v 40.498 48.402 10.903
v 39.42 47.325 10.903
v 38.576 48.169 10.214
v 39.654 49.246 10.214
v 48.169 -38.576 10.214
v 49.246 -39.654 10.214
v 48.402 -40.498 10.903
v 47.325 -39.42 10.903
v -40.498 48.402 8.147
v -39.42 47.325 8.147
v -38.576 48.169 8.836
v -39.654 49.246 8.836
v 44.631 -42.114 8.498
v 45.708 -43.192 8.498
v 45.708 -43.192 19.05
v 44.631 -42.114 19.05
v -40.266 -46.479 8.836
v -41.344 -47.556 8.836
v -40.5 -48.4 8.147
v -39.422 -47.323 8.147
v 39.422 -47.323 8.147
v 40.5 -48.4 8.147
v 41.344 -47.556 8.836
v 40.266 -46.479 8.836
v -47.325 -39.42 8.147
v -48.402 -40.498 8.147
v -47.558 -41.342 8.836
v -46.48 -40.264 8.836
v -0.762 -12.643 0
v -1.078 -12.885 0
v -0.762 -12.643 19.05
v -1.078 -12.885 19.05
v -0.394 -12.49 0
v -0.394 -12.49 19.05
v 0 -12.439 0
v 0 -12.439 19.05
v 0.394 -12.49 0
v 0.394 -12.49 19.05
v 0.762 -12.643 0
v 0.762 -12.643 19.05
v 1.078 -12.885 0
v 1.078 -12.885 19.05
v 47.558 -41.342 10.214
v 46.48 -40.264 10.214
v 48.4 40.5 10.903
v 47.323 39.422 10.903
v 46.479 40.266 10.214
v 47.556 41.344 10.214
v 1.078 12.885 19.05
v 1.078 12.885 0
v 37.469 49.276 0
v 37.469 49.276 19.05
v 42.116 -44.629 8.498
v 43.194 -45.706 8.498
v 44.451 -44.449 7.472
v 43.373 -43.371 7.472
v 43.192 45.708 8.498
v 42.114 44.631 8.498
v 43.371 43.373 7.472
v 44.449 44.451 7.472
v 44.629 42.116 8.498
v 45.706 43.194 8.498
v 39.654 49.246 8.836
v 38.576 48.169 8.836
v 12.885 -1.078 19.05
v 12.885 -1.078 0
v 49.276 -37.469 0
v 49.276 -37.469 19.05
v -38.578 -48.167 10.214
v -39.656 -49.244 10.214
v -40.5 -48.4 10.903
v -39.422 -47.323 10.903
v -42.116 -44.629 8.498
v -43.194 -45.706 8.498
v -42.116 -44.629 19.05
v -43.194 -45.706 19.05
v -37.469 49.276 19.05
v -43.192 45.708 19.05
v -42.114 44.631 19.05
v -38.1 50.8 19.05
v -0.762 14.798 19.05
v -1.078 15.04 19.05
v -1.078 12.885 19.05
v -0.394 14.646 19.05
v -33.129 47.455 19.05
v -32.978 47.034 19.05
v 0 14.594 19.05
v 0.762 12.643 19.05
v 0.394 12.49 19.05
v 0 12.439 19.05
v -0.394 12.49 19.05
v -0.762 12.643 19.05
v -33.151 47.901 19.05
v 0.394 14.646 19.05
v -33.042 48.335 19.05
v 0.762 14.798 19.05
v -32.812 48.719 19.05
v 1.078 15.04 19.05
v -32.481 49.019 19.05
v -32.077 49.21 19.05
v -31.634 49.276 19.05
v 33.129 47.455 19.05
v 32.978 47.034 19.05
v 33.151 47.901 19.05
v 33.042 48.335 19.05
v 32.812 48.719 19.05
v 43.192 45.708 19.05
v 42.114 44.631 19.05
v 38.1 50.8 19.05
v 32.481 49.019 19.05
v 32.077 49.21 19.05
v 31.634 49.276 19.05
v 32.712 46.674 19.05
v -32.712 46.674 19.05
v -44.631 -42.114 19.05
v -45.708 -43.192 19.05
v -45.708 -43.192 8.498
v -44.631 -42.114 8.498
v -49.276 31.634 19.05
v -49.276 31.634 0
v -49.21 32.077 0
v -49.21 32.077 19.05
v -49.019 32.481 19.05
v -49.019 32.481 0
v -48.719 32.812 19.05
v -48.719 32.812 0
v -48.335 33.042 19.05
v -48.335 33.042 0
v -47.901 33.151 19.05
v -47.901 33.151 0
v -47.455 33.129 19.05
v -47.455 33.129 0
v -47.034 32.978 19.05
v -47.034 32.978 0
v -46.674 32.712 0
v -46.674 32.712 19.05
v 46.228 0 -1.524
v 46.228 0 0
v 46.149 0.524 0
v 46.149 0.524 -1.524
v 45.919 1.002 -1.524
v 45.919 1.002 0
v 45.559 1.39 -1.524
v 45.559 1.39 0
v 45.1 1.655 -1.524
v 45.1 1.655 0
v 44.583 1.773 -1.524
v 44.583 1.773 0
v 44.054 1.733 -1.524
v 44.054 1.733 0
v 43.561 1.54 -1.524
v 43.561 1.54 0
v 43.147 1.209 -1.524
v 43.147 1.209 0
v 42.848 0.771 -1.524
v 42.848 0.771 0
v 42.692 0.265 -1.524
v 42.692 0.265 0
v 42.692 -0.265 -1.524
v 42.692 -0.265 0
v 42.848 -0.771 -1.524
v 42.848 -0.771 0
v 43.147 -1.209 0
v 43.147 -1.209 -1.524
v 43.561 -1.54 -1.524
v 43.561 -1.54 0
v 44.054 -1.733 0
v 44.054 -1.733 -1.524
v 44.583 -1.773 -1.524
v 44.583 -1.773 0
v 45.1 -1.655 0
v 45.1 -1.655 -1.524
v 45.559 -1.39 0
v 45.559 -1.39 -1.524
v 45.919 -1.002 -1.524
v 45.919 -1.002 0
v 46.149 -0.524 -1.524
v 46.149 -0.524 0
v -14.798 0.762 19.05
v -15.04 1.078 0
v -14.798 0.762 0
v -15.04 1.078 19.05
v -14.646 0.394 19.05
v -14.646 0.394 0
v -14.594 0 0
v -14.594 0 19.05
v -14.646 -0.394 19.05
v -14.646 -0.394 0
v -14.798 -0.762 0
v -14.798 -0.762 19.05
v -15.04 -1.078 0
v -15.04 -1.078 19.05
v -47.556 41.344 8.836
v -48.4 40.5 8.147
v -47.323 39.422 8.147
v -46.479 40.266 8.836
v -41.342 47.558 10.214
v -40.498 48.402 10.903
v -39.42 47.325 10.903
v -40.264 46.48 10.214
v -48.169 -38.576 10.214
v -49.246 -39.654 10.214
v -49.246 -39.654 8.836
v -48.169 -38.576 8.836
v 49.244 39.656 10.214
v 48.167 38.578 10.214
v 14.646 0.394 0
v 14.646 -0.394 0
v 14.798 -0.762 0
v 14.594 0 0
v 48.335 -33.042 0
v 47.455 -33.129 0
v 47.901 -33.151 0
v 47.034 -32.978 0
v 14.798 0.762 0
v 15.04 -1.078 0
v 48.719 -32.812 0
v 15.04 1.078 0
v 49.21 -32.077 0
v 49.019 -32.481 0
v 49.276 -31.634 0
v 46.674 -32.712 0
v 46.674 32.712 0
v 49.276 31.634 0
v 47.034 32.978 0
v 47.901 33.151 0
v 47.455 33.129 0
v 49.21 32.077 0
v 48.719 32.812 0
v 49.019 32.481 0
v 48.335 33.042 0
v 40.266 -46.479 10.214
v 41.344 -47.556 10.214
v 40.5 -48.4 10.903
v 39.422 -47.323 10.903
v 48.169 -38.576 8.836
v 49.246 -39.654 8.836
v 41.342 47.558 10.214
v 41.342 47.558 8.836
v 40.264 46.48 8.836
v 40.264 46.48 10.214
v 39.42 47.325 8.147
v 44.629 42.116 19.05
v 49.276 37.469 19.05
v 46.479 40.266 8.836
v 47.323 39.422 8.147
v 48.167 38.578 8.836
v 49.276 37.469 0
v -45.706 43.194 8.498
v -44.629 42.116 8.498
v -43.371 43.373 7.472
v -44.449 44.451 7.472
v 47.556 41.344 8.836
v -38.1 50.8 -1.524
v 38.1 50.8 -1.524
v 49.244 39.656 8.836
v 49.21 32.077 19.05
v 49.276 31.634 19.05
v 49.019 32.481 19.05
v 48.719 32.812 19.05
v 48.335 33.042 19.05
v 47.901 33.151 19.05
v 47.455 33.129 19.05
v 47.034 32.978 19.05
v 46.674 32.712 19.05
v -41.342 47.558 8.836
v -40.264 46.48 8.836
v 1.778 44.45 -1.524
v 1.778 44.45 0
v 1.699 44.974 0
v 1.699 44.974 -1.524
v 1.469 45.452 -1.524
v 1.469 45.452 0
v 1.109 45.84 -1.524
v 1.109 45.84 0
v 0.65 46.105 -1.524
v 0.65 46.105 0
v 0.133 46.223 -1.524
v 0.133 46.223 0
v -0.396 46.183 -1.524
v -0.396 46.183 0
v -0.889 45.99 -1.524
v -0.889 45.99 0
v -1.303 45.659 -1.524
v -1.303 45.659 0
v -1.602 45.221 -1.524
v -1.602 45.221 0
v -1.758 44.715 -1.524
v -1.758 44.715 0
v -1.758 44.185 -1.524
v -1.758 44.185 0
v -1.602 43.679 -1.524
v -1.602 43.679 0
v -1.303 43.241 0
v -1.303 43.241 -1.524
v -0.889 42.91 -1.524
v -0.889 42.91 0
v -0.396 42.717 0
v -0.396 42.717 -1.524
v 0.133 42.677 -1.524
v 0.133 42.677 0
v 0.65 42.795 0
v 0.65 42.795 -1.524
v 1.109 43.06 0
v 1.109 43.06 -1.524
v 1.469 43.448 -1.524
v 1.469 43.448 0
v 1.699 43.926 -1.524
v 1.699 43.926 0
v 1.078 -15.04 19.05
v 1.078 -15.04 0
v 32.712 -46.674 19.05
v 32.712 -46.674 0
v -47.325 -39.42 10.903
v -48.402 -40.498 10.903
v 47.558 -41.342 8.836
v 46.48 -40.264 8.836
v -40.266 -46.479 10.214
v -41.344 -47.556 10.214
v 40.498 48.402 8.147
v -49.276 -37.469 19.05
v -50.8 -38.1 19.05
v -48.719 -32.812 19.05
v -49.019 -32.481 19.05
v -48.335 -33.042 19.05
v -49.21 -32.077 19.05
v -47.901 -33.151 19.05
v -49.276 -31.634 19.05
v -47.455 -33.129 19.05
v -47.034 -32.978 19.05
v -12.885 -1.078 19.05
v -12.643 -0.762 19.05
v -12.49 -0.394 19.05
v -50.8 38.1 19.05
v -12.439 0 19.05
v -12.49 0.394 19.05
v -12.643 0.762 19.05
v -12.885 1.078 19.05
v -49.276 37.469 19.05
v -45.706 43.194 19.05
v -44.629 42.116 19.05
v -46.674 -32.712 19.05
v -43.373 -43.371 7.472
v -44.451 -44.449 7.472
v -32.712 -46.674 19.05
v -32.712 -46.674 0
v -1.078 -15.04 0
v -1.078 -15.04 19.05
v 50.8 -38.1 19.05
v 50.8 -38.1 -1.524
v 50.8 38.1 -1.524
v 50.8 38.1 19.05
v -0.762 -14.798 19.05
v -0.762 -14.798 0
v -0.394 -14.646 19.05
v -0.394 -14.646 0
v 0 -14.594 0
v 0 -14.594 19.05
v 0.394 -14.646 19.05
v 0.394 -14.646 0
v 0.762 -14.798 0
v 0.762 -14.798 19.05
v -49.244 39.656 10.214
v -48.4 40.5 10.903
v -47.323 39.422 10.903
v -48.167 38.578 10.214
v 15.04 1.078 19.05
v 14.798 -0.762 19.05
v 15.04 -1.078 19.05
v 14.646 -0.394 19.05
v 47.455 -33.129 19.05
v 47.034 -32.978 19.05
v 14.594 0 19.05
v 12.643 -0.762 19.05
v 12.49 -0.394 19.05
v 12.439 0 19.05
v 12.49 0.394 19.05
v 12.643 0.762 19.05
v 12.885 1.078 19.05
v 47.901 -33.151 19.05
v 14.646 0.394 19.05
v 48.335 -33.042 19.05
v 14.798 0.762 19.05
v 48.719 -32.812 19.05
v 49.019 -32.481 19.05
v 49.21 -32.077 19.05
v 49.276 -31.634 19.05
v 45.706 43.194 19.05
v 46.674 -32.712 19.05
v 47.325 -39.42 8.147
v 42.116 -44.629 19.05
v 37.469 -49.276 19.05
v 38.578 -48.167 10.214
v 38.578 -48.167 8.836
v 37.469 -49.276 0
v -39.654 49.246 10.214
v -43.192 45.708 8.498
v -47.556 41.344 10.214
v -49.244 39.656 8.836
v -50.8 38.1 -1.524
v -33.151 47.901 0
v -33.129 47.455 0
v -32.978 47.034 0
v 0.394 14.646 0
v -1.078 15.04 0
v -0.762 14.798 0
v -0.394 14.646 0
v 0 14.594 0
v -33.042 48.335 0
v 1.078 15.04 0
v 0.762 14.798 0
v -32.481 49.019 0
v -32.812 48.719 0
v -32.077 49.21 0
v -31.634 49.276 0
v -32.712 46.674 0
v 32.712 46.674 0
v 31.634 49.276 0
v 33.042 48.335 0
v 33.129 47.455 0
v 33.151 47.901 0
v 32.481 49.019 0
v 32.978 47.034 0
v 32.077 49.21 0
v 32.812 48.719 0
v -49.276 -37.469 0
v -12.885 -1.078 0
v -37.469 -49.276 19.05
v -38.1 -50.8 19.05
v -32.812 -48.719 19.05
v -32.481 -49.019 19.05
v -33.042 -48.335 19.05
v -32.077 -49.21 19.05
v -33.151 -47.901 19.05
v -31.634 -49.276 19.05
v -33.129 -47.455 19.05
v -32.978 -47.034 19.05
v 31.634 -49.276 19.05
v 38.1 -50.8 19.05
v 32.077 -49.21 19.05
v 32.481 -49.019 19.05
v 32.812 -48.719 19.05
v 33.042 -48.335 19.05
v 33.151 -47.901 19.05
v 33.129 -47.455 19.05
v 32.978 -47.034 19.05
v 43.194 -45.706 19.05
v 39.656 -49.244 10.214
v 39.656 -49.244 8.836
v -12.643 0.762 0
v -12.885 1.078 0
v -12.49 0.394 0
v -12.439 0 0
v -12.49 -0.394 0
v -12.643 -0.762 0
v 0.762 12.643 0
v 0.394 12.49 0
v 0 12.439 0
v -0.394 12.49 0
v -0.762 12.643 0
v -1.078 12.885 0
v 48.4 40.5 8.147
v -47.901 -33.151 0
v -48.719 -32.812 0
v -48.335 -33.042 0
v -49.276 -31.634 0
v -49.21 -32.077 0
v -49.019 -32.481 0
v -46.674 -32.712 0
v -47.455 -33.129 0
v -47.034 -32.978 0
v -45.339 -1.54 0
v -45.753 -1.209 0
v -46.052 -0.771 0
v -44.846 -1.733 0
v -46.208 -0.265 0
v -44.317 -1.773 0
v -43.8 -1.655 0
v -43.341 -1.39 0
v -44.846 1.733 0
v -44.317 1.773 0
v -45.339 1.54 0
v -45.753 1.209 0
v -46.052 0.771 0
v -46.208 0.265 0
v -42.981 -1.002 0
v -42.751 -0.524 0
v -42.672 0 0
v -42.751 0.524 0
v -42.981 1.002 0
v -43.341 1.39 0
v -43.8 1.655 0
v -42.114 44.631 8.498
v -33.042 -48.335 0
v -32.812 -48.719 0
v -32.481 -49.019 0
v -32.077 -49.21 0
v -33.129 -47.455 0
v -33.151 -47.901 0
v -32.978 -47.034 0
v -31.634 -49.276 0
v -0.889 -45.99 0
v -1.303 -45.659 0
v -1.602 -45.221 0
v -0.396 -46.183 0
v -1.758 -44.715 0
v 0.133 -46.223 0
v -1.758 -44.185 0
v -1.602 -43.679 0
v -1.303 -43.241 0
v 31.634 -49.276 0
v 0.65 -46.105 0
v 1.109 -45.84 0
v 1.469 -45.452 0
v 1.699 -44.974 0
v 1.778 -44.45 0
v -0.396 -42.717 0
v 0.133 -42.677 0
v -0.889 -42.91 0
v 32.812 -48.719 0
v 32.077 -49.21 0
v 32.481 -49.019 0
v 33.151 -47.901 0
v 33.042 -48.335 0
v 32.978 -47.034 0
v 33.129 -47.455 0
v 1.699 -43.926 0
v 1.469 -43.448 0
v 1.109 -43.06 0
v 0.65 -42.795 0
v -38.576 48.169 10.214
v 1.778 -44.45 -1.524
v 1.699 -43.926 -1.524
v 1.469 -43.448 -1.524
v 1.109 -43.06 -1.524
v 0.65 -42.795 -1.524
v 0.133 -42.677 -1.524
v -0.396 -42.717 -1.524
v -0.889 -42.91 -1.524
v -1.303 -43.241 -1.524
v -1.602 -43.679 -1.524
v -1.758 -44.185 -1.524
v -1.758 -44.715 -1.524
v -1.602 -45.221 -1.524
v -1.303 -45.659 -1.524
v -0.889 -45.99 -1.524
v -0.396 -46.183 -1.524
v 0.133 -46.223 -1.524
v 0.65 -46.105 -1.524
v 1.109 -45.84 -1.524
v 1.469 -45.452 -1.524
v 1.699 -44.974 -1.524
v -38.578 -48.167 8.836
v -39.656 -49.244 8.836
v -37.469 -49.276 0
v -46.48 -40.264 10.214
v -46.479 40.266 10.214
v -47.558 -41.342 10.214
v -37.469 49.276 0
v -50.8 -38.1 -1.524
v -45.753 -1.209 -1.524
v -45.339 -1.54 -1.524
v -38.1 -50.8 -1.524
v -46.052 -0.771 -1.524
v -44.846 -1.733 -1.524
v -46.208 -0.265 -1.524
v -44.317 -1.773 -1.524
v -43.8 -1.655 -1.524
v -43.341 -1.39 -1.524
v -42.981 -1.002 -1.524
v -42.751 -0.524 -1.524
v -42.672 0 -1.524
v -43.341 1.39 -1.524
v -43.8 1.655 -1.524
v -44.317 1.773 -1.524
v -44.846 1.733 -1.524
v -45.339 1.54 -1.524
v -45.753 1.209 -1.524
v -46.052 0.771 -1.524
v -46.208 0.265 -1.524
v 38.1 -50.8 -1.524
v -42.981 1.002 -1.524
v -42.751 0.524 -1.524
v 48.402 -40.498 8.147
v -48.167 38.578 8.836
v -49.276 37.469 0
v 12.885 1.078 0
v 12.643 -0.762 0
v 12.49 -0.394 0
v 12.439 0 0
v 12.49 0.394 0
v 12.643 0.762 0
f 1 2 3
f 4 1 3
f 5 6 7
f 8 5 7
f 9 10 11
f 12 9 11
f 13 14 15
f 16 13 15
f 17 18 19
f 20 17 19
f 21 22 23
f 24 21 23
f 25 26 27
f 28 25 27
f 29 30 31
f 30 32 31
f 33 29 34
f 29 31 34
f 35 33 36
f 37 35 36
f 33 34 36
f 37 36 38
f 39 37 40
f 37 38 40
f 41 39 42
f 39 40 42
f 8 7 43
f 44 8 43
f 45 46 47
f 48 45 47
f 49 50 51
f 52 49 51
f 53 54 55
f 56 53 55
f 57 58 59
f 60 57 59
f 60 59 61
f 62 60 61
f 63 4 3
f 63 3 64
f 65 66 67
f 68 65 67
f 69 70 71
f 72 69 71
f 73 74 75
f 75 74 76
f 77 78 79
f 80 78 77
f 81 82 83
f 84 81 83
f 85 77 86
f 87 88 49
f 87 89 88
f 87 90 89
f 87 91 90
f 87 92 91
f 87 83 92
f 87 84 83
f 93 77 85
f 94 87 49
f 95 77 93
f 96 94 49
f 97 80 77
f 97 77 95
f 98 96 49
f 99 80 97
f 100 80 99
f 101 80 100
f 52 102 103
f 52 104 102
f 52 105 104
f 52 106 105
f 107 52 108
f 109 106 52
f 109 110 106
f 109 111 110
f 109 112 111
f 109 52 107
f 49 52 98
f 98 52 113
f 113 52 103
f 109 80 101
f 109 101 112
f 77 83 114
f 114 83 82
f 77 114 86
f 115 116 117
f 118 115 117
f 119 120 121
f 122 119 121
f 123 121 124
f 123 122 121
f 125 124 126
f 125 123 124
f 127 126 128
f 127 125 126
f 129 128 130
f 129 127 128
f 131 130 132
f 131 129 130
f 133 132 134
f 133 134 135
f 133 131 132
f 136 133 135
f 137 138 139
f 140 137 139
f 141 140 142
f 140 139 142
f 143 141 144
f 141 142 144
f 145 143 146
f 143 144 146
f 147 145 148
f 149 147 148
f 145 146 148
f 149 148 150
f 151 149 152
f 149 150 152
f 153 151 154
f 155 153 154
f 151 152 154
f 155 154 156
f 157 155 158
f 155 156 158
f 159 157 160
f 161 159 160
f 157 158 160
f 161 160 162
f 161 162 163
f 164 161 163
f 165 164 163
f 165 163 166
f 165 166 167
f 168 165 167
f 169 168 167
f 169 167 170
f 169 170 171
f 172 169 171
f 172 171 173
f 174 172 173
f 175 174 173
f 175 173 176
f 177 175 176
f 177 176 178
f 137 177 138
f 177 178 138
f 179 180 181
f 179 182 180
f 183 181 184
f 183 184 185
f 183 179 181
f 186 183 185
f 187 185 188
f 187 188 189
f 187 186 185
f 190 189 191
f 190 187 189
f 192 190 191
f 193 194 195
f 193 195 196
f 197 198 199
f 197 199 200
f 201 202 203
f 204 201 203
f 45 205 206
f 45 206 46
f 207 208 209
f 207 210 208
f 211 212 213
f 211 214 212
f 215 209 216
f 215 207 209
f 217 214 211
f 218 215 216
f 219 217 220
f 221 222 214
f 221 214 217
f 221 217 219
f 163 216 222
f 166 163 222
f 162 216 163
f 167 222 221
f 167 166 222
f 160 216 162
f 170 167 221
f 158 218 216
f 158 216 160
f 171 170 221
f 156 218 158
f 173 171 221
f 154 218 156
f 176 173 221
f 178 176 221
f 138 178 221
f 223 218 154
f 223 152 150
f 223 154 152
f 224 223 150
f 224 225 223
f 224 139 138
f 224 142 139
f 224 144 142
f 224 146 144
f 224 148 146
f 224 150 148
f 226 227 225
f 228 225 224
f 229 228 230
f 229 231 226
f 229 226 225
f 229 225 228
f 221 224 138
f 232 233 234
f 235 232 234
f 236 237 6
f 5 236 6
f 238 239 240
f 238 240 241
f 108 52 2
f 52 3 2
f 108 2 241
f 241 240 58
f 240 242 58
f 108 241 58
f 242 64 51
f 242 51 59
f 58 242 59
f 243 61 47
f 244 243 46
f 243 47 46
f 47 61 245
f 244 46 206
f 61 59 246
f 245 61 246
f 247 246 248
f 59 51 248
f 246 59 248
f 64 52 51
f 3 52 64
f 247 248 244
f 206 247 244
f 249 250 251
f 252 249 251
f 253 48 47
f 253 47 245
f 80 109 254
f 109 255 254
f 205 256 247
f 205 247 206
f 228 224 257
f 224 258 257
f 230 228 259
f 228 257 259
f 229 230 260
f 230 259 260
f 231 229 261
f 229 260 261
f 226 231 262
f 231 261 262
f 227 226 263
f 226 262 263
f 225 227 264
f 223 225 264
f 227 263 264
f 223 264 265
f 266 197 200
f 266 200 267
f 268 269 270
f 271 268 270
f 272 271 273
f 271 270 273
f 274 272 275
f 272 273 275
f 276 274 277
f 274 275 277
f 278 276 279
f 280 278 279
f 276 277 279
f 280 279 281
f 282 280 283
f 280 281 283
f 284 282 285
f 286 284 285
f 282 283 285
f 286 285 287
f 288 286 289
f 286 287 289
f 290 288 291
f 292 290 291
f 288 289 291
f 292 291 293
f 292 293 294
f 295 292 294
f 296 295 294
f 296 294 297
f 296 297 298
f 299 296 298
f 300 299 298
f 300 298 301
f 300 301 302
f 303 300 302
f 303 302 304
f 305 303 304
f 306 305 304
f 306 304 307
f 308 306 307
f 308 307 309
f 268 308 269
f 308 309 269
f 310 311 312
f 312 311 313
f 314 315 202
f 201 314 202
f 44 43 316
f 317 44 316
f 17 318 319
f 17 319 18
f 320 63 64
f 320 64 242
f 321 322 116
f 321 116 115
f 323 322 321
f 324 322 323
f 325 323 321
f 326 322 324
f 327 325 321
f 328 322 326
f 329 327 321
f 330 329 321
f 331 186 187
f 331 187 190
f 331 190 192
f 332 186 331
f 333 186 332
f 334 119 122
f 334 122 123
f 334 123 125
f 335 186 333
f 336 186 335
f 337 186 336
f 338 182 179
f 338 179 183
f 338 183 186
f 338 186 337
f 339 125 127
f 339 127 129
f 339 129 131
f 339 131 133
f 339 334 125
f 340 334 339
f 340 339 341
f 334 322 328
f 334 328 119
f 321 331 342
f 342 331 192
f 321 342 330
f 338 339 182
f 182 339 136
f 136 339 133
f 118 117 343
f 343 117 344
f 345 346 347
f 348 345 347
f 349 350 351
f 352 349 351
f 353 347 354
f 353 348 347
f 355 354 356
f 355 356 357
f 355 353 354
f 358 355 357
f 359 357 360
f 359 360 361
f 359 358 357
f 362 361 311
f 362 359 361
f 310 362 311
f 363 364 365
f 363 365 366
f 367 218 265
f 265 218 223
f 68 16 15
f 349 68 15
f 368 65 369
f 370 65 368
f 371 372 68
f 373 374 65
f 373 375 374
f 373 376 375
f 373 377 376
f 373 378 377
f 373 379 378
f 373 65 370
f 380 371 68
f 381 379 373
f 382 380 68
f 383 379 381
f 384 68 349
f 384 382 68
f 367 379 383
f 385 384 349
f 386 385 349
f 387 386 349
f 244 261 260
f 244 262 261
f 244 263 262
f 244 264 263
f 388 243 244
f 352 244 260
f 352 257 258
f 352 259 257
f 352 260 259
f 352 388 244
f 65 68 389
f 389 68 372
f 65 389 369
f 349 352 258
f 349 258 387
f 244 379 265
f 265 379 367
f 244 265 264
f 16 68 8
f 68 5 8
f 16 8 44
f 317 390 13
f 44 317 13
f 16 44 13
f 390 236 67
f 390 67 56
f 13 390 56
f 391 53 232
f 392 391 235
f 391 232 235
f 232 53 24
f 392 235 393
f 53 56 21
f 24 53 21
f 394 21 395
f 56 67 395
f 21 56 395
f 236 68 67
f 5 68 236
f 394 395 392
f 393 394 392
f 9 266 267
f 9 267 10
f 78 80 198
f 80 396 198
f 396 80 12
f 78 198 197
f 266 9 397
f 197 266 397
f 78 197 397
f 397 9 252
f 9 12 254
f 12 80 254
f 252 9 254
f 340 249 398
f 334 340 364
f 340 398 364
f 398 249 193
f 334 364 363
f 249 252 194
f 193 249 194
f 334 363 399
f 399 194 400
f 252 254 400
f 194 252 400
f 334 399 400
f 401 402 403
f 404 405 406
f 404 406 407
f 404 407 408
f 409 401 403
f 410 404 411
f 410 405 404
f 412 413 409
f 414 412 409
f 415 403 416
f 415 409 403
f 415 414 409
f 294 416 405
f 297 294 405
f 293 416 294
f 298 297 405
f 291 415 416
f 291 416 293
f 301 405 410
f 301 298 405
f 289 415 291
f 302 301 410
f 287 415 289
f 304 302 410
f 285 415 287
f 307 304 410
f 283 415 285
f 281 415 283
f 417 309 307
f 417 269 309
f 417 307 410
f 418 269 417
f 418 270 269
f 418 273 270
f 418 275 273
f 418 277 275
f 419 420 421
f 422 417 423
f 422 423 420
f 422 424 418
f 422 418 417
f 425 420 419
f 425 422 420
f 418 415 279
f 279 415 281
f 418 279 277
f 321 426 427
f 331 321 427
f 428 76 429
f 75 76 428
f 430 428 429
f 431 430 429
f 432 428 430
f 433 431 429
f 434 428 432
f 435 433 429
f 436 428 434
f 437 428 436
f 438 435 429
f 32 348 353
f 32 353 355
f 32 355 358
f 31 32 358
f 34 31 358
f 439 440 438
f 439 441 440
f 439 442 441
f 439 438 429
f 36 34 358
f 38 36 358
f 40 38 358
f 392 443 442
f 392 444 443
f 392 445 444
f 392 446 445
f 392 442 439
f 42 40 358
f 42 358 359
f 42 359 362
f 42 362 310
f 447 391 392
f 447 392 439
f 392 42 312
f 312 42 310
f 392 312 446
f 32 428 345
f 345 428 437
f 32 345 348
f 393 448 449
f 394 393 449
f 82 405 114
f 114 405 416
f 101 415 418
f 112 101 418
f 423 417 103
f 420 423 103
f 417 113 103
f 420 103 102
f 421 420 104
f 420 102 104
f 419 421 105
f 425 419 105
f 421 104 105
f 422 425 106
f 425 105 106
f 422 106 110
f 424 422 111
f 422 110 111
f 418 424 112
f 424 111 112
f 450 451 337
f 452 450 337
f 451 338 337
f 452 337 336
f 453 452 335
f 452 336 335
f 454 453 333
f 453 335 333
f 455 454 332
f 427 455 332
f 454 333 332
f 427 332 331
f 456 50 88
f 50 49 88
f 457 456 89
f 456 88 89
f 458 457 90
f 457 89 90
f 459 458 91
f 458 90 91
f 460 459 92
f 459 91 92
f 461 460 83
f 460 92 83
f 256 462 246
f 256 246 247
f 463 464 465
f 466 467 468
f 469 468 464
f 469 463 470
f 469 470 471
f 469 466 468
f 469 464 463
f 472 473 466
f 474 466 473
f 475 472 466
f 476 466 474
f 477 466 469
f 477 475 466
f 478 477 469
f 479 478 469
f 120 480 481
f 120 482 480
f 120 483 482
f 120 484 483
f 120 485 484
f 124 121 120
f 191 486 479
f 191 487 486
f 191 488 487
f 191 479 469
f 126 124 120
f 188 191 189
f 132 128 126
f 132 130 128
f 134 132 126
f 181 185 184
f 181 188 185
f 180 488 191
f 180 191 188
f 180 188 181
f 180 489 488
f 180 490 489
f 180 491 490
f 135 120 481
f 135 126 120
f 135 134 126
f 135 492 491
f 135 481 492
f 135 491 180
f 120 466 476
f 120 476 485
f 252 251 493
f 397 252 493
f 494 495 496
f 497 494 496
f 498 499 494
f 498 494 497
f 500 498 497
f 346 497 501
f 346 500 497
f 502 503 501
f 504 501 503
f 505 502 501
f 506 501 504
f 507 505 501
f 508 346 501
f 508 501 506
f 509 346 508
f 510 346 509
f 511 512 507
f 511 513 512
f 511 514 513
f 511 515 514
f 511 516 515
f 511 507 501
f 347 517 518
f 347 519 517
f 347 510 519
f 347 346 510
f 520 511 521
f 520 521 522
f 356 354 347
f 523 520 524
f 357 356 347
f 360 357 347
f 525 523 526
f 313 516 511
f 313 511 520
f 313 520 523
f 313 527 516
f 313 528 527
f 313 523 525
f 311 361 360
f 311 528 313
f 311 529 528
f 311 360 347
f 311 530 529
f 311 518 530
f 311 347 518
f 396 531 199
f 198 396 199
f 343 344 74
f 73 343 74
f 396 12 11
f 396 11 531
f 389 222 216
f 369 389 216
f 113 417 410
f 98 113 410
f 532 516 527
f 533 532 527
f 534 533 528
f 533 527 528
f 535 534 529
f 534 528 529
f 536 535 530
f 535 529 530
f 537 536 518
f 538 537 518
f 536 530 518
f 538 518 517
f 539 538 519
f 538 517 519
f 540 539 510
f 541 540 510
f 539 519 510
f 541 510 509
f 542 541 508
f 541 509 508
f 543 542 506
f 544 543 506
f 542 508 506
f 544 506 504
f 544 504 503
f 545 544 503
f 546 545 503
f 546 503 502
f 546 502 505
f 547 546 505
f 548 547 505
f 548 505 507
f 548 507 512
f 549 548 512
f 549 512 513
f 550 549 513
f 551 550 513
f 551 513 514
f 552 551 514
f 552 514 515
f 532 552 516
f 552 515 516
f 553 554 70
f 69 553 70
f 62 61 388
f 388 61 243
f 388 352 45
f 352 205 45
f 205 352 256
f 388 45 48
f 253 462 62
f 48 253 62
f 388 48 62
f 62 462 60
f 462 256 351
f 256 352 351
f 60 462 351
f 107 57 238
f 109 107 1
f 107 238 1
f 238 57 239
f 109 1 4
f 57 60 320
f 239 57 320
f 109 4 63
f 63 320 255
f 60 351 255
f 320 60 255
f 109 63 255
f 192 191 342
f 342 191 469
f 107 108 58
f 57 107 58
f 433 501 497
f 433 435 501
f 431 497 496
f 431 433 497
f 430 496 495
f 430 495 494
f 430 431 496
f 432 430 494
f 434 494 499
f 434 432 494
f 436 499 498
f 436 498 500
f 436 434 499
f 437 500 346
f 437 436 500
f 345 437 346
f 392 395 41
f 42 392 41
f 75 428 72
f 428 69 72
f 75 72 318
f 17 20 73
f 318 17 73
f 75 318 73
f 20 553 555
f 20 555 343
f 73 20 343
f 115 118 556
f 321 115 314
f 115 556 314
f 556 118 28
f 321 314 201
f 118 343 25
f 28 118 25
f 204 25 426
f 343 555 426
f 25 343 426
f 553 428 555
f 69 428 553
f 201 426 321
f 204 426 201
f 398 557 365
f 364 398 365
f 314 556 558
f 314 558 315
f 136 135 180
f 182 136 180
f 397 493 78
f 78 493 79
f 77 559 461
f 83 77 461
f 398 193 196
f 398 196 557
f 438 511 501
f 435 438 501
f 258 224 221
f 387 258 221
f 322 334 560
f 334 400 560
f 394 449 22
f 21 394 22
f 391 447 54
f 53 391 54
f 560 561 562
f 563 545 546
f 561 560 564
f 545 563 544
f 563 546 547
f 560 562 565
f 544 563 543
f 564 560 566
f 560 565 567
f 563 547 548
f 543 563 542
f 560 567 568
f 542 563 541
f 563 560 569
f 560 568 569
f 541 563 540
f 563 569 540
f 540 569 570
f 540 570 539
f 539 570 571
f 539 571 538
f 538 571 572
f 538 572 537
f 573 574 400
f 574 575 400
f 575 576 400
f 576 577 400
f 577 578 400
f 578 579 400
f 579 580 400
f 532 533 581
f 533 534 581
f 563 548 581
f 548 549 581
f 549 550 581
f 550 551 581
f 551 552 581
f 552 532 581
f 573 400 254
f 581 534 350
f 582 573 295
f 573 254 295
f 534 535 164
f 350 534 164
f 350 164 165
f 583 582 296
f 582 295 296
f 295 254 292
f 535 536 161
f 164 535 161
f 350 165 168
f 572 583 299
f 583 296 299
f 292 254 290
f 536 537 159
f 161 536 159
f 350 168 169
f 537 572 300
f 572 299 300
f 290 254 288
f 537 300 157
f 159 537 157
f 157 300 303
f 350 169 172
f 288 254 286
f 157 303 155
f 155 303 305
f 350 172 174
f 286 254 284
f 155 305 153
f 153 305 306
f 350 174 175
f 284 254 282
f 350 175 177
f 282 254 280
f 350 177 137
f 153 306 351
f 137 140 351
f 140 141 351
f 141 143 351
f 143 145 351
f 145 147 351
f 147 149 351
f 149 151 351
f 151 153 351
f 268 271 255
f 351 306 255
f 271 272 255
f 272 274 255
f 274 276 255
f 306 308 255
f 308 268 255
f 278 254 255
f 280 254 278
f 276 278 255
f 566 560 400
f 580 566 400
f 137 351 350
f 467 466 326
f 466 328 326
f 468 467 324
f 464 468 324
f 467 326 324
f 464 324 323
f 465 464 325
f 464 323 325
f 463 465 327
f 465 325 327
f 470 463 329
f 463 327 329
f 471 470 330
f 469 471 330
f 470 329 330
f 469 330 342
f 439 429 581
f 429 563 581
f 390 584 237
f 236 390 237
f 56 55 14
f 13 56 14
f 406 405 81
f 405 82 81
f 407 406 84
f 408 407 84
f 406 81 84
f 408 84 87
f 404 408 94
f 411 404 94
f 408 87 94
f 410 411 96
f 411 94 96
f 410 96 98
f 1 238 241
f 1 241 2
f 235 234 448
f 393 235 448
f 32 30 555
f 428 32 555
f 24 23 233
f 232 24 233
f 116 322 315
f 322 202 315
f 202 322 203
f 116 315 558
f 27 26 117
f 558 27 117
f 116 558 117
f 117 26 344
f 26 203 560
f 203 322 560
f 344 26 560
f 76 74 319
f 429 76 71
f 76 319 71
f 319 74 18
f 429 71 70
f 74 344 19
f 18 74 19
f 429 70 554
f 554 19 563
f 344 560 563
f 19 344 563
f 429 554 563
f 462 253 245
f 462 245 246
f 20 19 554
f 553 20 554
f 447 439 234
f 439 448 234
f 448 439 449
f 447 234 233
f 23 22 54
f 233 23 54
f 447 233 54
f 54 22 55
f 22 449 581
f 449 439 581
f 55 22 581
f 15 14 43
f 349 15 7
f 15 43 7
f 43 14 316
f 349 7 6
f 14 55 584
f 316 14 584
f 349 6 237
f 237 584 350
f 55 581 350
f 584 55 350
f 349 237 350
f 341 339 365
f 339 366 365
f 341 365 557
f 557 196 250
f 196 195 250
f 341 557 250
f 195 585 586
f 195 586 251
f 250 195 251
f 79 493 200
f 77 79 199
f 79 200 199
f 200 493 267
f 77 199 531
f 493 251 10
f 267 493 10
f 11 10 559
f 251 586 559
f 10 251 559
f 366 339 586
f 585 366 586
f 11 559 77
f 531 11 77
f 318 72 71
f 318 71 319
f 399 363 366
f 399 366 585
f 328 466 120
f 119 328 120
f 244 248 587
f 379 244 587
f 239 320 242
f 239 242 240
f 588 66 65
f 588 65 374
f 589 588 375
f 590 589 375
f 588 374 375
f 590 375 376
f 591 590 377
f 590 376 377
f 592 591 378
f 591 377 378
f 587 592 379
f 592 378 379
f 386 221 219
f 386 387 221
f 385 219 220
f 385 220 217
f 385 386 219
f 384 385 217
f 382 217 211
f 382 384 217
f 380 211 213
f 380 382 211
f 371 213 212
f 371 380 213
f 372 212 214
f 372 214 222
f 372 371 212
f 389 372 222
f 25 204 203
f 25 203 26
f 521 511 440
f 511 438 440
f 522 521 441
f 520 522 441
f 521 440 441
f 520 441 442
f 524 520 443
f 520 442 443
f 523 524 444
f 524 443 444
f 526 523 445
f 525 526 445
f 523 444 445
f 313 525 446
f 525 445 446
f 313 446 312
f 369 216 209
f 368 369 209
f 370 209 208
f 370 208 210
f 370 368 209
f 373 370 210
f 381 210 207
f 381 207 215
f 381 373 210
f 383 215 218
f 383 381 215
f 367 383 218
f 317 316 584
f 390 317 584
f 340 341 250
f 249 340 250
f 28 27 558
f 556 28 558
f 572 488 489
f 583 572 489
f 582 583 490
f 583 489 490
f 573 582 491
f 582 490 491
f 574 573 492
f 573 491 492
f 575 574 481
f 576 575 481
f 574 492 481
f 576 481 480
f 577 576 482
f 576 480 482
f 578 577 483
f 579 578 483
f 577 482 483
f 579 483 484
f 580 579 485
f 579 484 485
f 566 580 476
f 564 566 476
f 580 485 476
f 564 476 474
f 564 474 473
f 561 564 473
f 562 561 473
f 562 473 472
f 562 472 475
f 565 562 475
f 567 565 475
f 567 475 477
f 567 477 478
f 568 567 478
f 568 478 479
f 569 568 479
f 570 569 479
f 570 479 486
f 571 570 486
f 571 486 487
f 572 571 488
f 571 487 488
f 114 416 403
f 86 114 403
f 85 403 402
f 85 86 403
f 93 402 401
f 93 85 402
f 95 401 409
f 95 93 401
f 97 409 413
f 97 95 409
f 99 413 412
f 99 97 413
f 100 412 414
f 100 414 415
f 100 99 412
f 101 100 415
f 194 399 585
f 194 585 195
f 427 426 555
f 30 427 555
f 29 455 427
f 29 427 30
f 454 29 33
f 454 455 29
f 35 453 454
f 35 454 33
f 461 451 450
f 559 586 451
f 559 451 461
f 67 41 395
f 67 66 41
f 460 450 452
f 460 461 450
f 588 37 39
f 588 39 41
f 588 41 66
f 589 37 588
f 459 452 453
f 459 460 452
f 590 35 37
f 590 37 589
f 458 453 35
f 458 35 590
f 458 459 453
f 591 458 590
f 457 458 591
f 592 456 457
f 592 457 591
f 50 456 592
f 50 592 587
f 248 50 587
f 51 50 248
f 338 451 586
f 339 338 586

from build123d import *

# Parameters (mm, degrees)
F1_DEPTH  = 1.524
F2_DEPTH  = 19.05
F3_R      = 1.524
F4_R      = 1.524
F5_R      = 1.524
F6_R      = 1.524
F9_DEPTH  = 127
F12_DEPTH = 127
F13_R     = 1.778
F14_DEPTH = 1.524


with BuildPart() as f1:
    # F0 (on Top) → F1 (new body)
    with BuildSketch(Plane.XY):
        Polygon((50.8, 38.1), (38.1, 50.8), (-38.1, 50.8), (-50.8, 38.1), (-50.8, -38.1), (-38.1, -50.8), (38.1, -50.8), (50.8, -38.1), align=None)
        Polygon((-49.276, 35.3134770619), (-49.276, 37.4687385309), (-37.4687385309, 49.276), (-35.3134770619, 49.276), (35.3134770619, 49.276), (37.4687385309, 49.276), (49.276, 37.4687385309), (49.276, 35.3134770619), (49.276, -35.3134770619), (49.276, -37.4687385309), (37.4687385309, -49.276), (35.3134770619, -49.276), (-35.3134770619, -49.276), (-37.4687385309, -49.276), (-49.276, -37.4687385309), (-49.276, -35.3134770619), align=None, mode=Mode.SUBTRACT)
        Polygon((-13.9625229381, 0), (-49.276, 35.3134770619), (-49.276, -35.3134770619), align=None)
        Polygon((-11.8072614691, 0), (-49.276, 37.4687385309), (-49.276, 35.3134770619), (-13.9625229381, 0), (-49.276, -35.3134770619), (-49.276, -37.4687385309), align=None)
        Polygon((-37.4687385309, 49.276), (-49.276, 37.4687385309), (-11.8072614691, 0), (-49.276, -37.4687385309), (-37.4687385309, -49.276), (0, -11.8072614691), (37.4687385309, -49.276), (49.276, -37.4687385309), (11.8072614691, 0), (49.276, 37.4687385309), (37.4687385309, 49.276), (0, 11.8072614691), align=None)
        Polygon((-35.3134770619, 49.276), (-37.4687385309, 49.276), (0, 11.8072614691), (37.4687385309, 49.276), (35.3134770619, 49.276), (0, 13.9625229381), align=None)
        Polygon((49.276, 35.3134770619), (49.276, 37.4687385309), (11.8072614691, 0), (49.276, -37.4687385309), (49.276, -35.3134770619), (13.9625229381, 0), align=None)
        Polygon((35.3134770619, 49.276), (-35.3134770619, 49.276), (0, 13.9625229381), align=None)
        Polygon((0, -11.8072614691), (-37.4687385309, -49.276), (-35.3134770619, -49.276), (0, -13.9625229381), (35.3134770619, -49.276), (37.4687385309, -49.276), align=None)
        Polygon((0, -13.9625229381), (-35.3134770619, -49.276), (35.3134770619, -49.276), align=None)
        Polygon((49.276, -35.3134770619), (49.276, 35.3134770619), (13.9625229381, 0), align=None)
    extrude(amount=-F1_DEPTH)

    # F0 (on Top) → F2 (join)
    with BuildSketch(Plane.XY):
        Polygon((50.8, 38.1), (38.1, 50.8), (-38.1, 50.8), (-50.8, 38.1), (-50.8, -38.1), (-38.1, -50.8), (38.1, -50.8), (50.8, -38.1), align=None)
        Polygon((-49.276, 35.3134770619), (-49.276, 37.4687385309), (-37.4687385309, 49.276), (-35.3134770619, 49.276), (35.3134770619, 49.276), (37.4687385309, 49.276), (49.276, 37.4687385309), (49.276, 35.3134770619), (49.276, -35.3134770619), (49.276, -37.4687385309), (37.4687385309, -49.276), (35.3134770619, -49.276), (-35.3134770619, -49.276), (-37.4687385309, -49.276), (-49.276, -37.4687385309), (-49.276, -35.3134770619), align=None, mode=Mode.SUBTRACT)
        Polygon((-11.8072614691, 0), (-49.276, 37.4687385309), (-49.276, 35.3134770619), (-13.9625229381, 0), (-49.276, -35.3134770619), (-49.276, -37.4687385309), align=None)
        Polygon((-35.3134770619, 49.276), (-37.4687385309, 49.276), (0, 11.8072614691), (37.4687385309, 49.276), (35.3134770619, 49.276), (0, 13.9625229381), align=None)
        Polygon((0, -11.8072614691), (-37.4687385309, -49.276), (-35.3134770619, -49.276), (0, -13.9625229381), (35.3134770619, -49.276), (37.4687385309, -49.276), align=None)
        Polygon((49.276, 35.3134770619), (49.276, 37.4687385309), (11.8072614691, 0), (49.276, -37.4687385309), (49.276, -35.3134770619), (13.9625229381, 0), align=None)
    extrude(amount=F2_DEPTH)

    # F3
    f3_edges = [f1.edges().sort_by_distance(p)[0] for p in [
        (-35.313477, 49.276, 9.525),
        (35.313477, 49.276, 9.525),
        (0, 13.962523, 9.525),
        (0, 11.807261, 9.525),
    ]]
    fillet(f3_edges, radius=F3_R)

    # F4
    f4_edges = [f1.edges().sort_by_distance(p)[0] for p in [
        (-13.962523, 0, 9.525),
        (-11.807261, 0, 9.525),
        (-49.276, 35.313477, 9.525),
        (-49.276, -35.313477, 9.525),
    ]]
    fillet(f4_edges, radius=F4_R)

    # F5
    f5_edges = [f1.edges().sort_by_distance(p)[0] for p in [
        (35.313477, -49.276, 9.525),
        (-35.313477, -49.276, 9.525),
        (0, -13.962523, 9.525),
        (0, -11.807261, 9.525),
    ]]
    fillet(f5_edges, radius=F5_R)

    # F6
    f6_edges = [f1.edges().sort_by_distance(p)[0] for p in [
        (49.276, -35.313477, 9.525),
        (49.276, 35.313477, 9.525),
        (13.962523, 0, 9.525),
        (11.807261, 0, 9.525),
    ]]
    fillet(f6_edges, radius=F6_R)

    # F8 (on offset) → F9 (cut)
    with BuildSketch(Plane(origin=(-44.45, -44.45, 0), x_dir=(0.7071067812, -0.7071067812, 0), z_dir=(-0.7071067812, -0.7071067812, 0))):
        Polygon((-4.3955561211, 8.8357592486), (-4.3955561211, 10.2142407514), (-5.5893561211, 10.9034815027), (-6.7831561211, 10.2142407514), (-6.7831561211, 8.8357592486), (-5.5893561211, 8.1465184973), align=None)
        Polygon((1.7766438789, 8.4984712214), (1.7766438789, 10.5515287786), (-0.0013561211, 11.5780575572), (-1.7793561211, 10.5515287786), (-1.7793561211, 8.4984712214), (-0.0013561211, 7.4719424428), align=None)
        Polygon((-0.0013561211, 11.5780575572), (1.7766438789, 10.5515287786), (1.7766438789, 19.05), (-1.7793561211, 19.05), (-1.7793561211, 10.5515287786), align=None)
        Polygon((6.7804438789, 8.8357592486), (6.7804438789, 10.2142407514), (5.5866438789, 10.9034815027), (4.3928438789, 10.2142407514), (4.3928438789, 8.8357592486), (5.5866438789, 8.1465184973), align=None)
    extrude(amount=-F9_DEPTH, mode=Mode.SUBTRACT)

    # F11 (on offset) → F12 (cut)
    with BuildSketch(Plane(origin=(44.45, -44.45, 0), x_dir=(0.7071067812, 0.7071067812, 0), z_dir=(0.7071067812, -0.7071067812, 0))):
        Polygon((-4.3928438789, 8.8357592486), (-4.3928438789, 10.2142407514), (-5.5866438789, 10.9034815027), (-6.7804438789, 10.2142407514), (-6.7804438789, 8.8357592486), (-5.5866438789, 8.1465184973), align=None)
        Polygon((0.0013561211, 11.5780575572), (1.7793561211, 10.5515287786), (1.7793561211, 19.05), (-1.7766438789, 19.05), (-1.7766438789, 10.5515287786), align=None)
        Polygon((1.7793561211, 8.4984712214), (1.7793561211, 10.5515287786), (0.0013561211, 11.5780575572), (-1.7766438789, 10.5515287786), (-1.7766438789, 8.4984712214), (0.0013561211, 7.4719424428), align=None)
        Polygon((6.7831561211, 8.8357592486), (6.7831561211, 10.2142407514), (5.5893561211, 10.9034815027), (4.3955561211, 10.2142407514), (4.3955561211, 8.8357592486), (5.5893561211, 8.1465184973), align=None)
    extrude(amount=-F12_DEPTH, mode=Mode.SUBTRACT)

    # F13 (on Top) → F14 (cut)
    with BuildSketch(Plane.XY):
        with Locations((-44.45, 0)):
            Circle(F13_R)
        with Locations((0, 44.45)):
            Circle(F13_R)
        with Locations((44.45, 0)):
            Circle(F13_R)
        with Locations((0, -44.45)):
            Circle(F13_R)
    extrude(amount=-F14_DEPTH, mode=Mode.SUBTRACT)


solid = f1.part
